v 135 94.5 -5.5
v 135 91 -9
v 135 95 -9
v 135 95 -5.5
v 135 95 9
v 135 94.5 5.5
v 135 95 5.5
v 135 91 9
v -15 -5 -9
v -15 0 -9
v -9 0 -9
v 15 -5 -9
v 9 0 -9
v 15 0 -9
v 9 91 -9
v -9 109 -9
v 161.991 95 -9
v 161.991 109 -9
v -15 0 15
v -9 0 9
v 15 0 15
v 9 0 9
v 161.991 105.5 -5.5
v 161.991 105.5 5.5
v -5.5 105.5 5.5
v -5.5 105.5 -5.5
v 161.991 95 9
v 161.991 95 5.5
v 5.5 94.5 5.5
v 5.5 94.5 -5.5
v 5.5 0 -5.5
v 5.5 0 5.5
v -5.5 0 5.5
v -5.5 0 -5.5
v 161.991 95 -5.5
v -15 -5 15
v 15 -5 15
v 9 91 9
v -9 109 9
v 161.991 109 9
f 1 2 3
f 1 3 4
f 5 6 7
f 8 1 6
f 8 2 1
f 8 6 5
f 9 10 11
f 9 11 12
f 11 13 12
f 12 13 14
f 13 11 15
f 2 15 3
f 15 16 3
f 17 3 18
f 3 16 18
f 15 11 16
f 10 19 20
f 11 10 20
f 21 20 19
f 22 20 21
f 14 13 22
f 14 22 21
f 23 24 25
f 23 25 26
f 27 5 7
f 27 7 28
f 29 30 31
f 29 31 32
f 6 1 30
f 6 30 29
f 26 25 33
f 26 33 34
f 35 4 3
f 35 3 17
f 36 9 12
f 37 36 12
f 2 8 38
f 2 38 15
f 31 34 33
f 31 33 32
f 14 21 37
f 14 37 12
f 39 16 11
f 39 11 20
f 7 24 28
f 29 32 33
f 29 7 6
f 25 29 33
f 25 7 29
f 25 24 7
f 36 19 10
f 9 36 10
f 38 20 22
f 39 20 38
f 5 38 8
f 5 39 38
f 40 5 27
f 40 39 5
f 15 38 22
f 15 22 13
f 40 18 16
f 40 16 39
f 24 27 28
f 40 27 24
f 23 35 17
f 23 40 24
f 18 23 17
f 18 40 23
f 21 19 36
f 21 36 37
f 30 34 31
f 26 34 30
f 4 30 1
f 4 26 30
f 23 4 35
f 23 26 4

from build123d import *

# Parameters (mm, degrees)
SKETCH2_W           = 18
SKETCH2_H           = 18
SKETCH2_W_2         = 11
SKETCH2_H_2         = 11
SKETCH3_W           = 30
SKETCH3_H           = 30
SKETCH3_W_2         = 33.981635874
SKETCH3_H_2         = 34.73651567
BOSS_EXTRUDE1_DEPTH = 5
SKETCH4_W           = 50
SKETCH4_H           = 18
CUT_EXTRUDE1_DEPTH  = 4
SKETCH5_W           = 61.801380332
SKETCH5_H           = 123.620772257
CUT_EXTRUDE2_DEPTH  = 175
SKETCH6_W           = 30
SKETCH6_H           = 6
CUT_EXTRUDE3_DEPTH  = 10


with BuildPart() as part:
    # Sweep2: sweep along a path in Sketch1
    with BuildLine(Plane.XY) as sweep2_path:
        Line((0, 0), (0, 100))
        Line((0, 100), (320, 100))
        Line((320, 100), (320, 0))
    # Sketch2 → Sweep2 (sweep)
    with BuildSketch(Plane(origin=(0, 0, 0), x_dir=(1, 0, 0), z_dir=(0, 1, 0))):
        Rectangle(SKETCH2_W, SKETCH2_H)
        Rectangle(SKETCH2_W_2, SKETCH2_H_2, mode=Mode.SUBTRACT)
    sweep(path=sweep2_path.line, transition=Transition.RIGHT)

    # Sketch3 → Boss-Extrude1 (add)
    with BuildSketch(Plane(origin=(0, 0, 0), x_dir=(1, 0, 0), z_dir=(0, 1, 0))):
        Rectangle(SKETCH3_W, SKETCH3_H)
        with Locations((320, 0)):
            Rectangle(SKETCH3_W_2, SKETCH3_H_2)
    extrude(amount=-BOSS_EXTRUDE1_DEPTH)

    # Sketch4 → Cut-Extrude1 (cut)
    with BuildSketch(Plane.XZ.offset(-91)):
        with Locations((160, 0)):
            Rectangle(SKETCH4_W, SKETCH4_H)
    extrude(amount=-CUT_EXTRUDE1_DEPTH, mode=Mode.SUBTRACT)

    # Sketch5 → Cut-Extrude2 (cut)
    with BuildSketch(Plane(origin=(336.990817937, 0, 0), x_dir=(0, 0, -1), z_dir=(1, 0, 0))):
        with Locations((13.532432331, 56.810386129)):
            Rectangle(SKETCH5_W, SKETCH5_H)
    extrude(amount=-CUT_EXTRUDE2_DEPTH, mode=Mode.SUBTRACT)

    # Sketch6 → Cut-Extrude3 (cut)
    with BuildSketch(Plane(origin=(0, 0, 0), x_dir=(1, 0, 0), z_dir=(0, 1, 0))):
        with Locations((0, 12)):
            Rectangle(SKETCH6_W, SKETCH6_H)
    extrude(amount=-CUT_EXTRUDE3_DEPTH, mode=Mode.SUBTRACT)


solid = part.part
